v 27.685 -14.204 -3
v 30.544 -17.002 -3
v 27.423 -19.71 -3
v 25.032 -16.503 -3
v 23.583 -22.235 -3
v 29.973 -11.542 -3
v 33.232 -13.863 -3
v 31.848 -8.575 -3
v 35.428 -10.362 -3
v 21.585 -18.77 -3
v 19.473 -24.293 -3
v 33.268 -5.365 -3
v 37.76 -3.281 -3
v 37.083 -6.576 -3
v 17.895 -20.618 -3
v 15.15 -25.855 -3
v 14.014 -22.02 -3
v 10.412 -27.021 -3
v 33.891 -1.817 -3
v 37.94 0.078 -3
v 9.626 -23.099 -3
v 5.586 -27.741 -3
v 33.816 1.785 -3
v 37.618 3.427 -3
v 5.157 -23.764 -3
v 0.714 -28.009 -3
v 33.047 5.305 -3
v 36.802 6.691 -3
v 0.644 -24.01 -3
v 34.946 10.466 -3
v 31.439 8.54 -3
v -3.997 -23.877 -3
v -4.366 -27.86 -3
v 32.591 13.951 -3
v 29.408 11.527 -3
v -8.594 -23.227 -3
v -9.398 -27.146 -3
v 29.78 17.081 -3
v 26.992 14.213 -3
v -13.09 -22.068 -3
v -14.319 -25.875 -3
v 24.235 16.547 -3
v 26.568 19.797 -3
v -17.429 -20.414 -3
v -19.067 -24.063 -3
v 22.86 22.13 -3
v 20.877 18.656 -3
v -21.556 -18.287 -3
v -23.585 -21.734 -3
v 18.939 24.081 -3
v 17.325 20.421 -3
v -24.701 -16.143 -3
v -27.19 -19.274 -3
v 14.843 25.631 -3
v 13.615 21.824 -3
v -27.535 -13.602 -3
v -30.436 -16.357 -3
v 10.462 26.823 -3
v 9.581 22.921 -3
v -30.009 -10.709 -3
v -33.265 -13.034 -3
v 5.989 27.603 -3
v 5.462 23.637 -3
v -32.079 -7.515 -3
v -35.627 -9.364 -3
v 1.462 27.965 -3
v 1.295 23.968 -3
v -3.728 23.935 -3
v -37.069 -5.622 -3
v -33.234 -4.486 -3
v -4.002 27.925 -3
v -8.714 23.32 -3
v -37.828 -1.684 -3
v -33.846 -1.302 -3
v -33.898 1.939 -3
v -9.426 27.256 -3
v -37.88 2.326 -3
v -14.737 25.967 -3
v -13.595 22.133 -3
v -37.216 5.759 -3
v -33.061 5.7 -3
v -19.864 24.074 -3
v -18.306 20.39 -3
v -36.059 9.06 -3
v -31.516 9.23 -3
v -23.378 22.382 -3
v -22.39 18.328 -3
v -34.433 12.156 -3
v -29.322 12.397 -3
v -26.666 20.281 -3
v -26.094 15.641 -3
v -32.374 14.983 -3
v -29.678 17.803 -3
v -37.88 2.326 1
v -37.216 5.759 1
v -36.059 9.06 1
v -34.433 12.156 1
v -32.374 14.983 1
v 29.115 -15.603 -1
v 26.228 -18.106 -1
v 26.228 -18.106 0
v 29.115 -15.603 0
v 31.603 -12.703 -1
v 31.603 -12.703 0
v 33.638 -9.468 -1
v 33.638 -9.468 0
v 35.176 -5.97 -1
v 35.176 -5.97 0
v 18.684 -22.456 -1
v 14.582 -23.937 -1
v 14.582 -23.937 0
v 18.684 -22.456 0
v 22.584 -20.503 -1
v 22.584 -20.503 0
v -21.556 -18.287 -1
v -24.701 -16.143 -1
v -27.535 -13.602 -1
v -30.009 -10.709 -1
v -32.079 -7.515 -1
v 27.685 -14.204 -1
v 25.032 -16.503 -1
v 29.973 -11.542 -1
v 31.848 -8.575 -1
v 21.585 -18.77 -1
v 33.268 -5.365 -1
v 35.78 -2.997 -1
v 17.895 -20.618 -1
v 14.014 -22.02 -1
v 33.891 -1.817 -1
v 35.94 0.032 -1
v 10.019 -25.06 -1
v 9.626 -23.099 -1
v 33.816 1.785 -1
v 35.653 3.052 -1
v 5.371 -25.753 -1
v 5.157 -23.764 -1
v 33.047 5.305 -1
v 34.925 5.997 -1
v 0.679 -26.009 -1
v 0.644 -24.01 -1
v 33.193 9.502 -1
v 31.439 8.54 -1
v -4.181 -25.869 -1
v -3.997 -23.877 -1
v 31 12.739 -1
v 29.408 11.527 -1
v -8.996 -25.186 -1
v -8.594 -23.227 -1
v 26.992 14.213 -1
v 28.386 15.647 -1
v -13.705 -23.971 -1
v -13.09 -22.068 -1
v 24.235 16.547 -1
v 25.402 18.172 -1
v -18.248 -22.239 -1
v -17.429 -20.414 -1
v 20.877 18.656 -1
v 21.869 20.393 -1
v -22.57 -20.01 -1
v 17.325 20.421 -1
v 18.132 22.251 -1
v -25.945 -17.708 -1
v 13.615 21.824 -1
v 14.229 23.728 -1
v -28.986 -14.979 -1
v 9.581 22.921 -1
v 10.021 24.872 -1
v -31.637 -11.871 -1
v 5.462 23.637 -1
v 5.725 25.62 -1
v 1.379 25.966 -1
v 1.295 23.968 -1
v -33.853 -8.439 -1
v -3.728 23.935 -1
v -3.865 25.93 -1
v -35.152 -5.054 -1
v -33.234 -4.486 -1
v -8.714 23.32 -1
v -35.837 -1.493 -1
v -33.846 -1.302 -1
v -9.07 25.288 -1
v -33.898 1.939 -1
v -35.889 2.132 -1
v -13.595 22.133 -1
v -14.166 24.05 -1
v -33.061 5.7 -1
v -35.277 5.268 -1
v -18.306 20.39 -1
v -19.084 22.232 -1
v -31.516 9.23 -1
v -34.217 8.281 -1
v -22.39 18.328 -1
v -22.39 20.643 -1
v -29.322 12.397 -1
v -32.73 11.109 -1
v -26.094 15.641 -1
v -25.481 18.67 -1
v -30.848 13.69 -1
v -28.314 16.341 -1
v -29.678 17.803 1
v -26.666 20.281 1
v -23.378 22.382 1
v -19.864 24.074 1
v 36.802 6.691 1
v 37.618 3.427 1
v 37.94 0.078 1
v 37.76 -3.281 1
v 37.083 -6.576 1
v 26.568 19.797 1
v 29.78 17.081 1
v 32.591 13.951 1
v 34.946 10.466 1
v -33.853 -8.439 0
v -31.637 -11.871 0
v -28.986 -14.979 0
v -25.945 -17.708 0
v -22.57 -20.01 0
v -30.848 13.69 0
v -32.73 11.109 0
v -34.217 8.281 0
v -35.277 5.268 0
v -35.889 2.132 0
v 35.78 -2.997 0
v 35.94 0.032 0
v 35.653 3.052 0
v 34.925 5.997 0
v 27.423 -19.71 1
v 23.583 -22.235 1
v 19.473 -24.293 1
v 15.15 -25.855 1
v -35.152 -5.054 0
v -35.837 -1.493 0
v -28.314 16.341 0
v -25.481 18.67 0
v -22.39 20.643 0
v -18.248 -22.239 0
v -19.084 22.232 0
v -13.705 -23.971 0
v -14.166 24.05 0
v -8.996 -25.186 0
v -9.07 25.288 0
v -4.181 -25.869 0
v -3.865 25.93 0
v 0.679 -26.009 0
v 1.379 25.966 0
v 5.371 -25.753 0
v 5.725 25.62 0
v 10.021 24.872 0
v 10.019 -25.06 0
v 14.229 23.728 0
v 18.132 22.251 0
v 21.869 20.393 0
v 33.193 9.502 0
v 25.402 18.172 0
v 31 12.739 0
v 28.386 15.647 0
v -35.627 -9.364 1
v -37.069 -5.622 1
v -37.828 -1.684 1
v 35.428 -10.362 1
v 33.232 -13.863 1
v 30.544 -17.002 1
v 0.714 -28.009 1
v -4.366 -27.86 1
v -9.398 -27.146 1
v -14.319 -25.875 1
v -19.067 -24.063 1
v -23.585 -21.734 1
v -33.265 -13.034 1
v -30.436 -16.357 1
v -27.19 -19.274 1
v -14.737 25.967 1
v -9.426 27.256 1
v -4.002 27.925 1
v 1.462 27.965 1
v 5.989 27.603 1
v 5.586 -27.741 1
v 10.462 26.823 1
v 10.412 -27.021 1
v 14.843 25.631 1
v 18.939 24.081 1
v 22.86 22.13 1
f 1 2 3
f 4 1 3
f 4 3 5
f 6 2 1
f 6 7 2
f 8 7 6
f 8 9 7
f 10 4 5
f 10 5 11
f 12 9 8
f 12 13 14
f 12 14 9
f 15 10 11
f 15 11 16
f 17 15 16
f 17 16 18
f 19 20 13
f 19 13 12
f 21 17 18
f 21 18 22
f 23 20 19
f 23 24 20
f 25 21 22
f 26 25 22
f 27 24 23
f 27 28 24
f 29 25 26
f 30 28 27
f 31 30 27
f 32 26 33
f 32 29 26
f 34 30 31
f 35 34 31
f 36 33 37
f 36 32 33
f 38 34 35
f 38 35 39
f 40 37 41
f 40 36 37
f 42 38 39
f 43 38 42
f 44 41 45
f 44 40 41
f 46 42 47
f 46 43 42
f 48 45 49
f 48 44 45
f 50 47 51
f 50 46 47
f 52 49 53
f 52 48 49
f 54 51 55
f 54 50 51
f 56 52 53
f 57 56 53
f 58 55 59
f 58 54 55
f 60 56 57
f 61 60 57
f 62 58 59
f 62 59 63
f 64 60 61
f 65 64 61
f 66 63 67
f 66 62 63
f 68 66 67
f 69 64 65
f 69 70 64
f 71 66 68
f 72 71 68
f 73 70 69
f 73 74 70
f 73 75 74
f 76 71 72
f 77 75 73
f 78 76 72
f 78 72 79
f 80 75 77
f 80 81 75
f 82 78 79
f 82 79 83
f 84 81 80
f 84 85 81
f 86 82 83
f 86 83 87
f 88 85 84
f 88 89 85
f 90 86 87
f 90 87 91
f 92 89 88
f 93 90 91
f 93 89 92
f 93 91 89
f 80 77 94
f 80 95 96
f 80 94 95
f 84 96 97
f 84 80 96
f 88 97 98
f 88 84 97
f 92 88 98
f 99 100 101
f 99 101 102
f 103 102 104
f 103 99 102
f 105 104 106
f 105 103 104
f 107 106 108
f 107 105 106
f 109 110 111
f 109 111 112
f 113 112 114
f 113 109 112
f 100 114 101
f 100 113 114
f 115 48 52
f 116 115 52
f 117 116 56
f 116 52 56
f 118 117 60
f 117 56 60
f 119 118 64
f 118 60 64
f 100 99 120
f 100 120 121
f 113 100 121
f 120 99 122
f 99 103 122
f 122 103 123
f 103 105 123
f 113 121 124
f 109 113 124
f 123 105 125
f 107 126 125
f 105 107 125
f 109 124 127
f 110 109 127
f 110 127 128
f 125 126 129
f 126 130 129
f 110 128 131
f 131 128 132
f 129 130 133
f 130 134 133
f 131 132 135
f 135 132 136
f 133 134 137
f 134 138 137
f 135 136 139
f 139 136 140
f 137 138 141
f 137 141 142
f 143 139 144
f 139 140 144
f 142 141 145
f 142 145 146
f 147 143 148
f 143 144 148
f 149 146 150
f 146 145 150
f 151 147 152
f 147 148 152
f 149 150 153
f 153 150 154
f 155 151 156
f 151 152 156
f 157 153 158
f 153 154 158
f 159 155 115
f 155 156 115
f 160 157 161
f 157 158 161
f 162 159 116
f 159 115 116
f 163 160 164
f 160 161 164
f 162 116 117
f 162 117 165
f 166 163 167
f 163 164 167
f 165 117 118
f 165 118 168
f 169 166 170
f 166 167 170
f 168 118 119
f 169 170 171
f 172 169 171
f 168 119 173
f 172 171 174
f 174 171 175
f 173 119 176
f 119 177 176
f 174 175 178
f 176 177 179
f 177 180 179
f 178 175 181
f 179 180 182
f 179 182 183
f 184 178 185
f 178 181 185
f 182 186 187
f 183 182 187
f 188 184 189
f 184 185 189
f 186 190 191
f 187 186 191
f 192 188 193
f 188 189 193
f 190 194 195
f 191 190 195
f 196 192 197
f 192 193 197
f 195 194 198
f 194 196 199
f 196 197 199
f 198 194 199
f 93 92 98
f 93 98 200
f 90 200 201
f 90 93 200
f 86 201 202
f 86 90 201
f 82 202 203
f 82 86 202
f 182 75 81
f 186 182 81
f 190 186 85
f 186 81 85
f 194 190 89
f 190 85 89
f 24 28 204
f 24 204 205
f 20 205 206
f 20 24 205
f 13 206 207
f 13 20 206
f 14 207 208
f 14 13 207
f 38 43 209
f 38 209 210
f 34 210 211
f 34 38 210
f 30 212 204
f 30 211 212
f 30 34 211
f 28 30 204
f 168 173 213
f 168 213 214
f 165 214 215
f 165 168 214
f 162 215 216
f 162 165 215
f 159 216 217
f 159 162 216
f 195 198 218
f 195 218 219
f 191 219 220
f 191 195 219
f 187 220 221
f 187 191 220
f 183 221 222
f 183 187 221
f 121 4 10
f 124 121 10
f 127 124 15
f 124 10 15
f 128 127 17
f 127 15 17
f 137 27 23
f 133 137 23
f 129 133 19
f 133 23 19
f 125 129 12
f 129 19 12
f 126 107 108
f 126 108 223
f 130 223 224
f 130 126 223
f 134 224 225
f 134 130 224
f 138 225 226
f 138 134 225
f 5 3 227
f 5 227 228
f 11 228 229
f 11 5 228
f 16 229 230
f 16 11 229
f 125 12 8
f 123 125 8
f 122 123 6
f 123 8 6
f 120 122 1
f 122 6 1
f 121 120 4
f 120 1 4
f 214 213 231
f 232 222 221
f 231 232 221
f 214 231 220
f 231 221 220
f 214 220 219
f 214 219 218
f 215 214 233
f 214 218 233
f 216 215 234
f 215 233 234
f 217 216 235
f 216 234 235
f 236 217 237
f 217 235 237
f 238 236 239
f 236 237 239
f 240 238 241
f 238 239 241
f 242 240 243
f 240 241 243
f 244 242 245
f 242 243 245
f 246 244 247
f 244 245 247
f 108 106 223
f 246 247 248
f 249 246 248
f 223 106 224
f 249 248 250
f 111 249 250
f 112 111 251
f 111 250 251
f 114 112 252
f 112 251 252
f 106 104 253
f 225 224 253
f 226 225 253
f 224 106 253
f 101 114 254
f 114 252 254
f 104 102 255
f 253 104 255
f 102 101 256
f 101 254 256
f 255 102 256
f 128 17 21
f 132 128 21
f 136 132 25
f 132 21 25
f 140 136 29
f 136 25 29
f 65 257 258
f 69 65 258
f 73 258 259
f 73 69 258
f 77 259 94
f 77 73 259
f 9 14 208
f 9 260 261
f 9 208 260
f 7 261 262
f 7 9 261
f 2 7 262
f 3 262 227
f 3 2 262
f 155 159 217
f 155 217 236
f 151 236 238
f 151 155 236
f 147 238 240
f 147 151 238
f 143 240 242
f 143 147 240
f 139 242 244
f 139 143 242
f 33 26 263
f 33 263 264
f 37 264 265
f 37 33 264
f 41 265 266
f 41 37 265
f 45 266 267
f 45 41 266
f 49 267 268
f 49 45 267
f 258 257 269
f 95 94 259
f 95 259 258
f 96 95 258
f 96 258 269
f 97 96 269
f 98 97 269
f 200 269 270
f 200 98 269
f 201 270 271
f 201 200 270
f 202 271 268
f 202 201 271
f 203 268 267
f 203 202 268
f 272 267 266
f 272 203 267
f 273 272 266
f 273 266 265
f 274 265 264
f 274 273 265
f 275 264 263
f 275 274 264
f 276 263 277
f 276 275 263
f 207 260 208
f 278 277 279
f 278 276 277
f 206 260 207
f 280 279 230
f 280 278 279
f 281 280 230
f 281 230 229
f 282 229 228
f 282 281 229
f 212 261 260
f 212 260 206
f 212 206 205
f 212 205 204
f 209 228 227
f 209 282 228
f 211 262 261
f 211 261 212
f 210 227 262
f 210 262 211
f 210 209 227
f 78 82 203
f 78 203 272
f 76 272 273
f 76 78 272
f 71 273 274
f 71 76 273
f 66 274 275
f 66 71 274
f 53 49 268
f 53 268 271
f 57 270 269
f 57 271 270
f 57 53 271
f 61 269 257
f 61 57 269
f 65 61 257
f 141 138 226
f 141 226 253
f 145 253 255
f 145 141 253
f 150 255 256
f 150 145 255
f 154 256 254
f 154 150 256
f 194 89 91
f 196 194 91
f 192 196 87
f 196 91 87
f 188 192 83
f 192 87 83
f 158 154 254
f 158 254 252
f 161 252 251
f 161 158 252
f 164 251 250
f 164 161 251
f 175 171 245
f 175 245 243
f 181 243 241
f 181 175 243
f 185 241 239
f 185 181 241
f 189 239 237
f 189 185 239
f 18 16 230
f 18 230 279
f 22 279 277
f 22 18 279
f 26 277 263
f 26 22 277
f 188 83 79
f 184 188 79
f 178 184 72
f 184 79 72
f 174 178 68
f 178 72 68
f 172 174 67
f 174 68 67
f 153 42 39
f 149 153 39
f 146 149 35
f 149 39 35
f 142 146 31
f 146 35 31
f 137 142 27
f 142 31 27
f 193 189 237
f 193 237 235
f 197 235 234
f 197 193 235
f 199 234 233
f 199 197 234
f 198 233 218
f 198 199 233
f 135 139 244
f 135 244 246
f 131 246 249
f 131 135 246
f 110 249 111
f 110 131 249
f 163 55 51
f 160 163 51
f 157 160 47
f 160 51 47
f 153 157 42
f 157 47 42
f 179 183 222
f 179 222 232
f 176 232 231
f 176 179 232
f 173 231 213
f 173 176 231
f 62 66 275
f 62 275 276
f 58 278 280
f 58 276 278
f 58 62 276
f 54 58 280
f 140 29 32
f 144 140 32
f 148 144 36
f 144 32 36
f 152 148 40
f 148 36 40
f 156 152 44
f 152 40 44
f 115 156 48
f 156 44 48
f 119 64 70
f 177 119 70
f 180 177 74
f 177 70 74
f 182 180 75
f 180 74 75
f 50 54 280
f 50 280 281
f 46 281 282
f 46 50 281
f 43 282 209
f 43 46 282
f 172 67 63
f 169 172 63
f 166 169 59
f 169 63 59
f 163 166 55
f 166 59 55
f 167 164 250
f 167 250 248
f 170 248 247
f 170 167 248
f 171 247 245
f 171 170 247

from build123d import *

# Parameters (mm, degrees)
BOSS_EXTRUDE1_DEPTH = 1
BOSS_EXTRUDE2_START = -2
BOSS_EXTRUDE2_DEPTH = 2
BOSS_EXTRUDE3_START = 2
BOSS_EXTRUDE3_DEPTH = 2


with BuildPart() as part:
    # Sketch2 → Boss-Extrude1 (new body)
    with BuildSketch(Plane.XY):
        with BuildLine():
            ThreePointArc((14.582306461, -23.937478676), (20.662688223, -21.536481735), (26.227582561, -18.10606198))
            ThreePointArc((26.227582561, -18.10606198), (31.602803157, -12.702637223), (35.175830441, -5.970366314))
            ThreePointArc((35.175830441, -5.970366314), (35.940455788, 0.032211939), (34.924872534, 5.997460321))
            ThreePointArc((34.924872534, 5.997460321), (30.999615253, 12.739070672), (25.401678251, 18.172306925))
            ThreePointArc((25.401678251, 18.172306925), (20.023450582, 21.36826462), (14.22923276, 23.727611624))
            ThreePointArc((14.22923276, 23.727611624), (7.882073391, 25.295796991), (1.378547715, 25.966461733))
            ThreePointArc((1.378547715, 25.966461733), (-9.069964823, 25.28846457), (-19.084442092, 22.232104078))
            ThreePointArc((-19.084442092, 22.232104078), (-25.480773521, 18.669901445), (-30.847619904, 13.690011561))
            ThreePointArc((-30.847619904, 13.690011561), (-34.216625408, 8.281245191), (-35.888880176, 2.132382229))
            ThreePointArc((-35.888880176, 2.132382229), (-35.572811659, -3.288450427), (-33.85309471, -8.438974634))
            ThreePointArc((-33.85309471, -8.438974634), (-28.98576201, -14.979441817), (-22.570123581, -20.01016961))
            ThreePointArc((-22.570123581, -20.01016961), (-11.367274893, -24.644691823), (0.679303276, -26.009451613))
            ThreePointArc((0.679303276, -26.009451613), (7.703427235, -25.460763497), (14.582306461, -23.937478676))
        make_face()
    extrude(amount=BOSS_EXTRUDE1_DEPTH)

    # Sketch3 → Boss-Extrude2 (add)
    with BuildSketch(Plane.XY.offset(1).offset(BOSS_EXTRUDE2_START)):
        with BuildLine():
            ThreePointArc((-23.584596954, -21.733783191), (-11.876170523, -26.578887071), (0.714158664, -28.009233893))
            ThreePointArc((0.714158664, -28.009233893), (8.007585987, -27.437521821), (15.150208477, -25.855156256))
            ThreePointArc((15.150208477, -25.855156256), (21.558193731, -23.324796552), (27.422917732, -19.709549999))
            ThreePointArc((27.422917732, -19.709549999), (33.232049111, -13.863052711), (37.082922231, -6.576193708))
            ThreePointArc((37.082922231, -6.576193708), (37.93992708, 0.078373421), (36.802232938, 6.690738583))
            ThreePointArc((36.802232938, 6.690738583), (32.590590722, 13.951259274), (26.567668782, 19.797412042))
            ThreePointArc((26.567668782, 19.797412042), (20.924163176, 23.153997512), (14.843057348, 25.631087228))
            ThreePointArc((14.843057348, 25.631087228), (8.234147075, 27.264583601), (1.462460857, 27.964777266))
            ThreePointArc((1.462460857, 27.964777266), (-9.426205562, 27.256483976), (-19.863550161, 24.074256219))
            ThreePointArc((-19.863550161, 24.074256219), (-26.665599434, 20.281211791), (-32.373640199, 14.982784573))
            ThreePointArc((-32.373640199, 14.982784573), (-36.059000484, 9.059793769), (-37.879998788, 2.325726228))
            ThreePointArc((-37.879998788, 2.325726228), (-37.536082018, -3.670000019), (-35.627002731, -9.364069587))
            ThreePointArc((-35.627002731, -9.364069587), (-30.435882217, -16.357044434), (-23.584596954, -21.733783191))
        make_face()
        with BuildLine():
            ThreePointArc((-22.570123581, -20.01016961), (-11.367274893, -24.644691823), (0.679303276, -26.009451613))
            ThreePointArc((0.679303276, -26.009451613), (7.703427235, -25.460763497), (14.582306461, -23.937478676))
            ThreePointArc((14.582306461, -23.937478676), (20.662688223, -21.536481735), (26.227582561, -18.10606198))
            ThreePointArc((26.227582561, -18.10606198), (31.602803157, -12.702637223), (35.175830441, -5.970366314))
            ThreePointArc((35.175830441, -5.970366314), (35.940455788, 0.032211939), (34.924872534, 5.997460321))
            ThreePointArc((34.924872534, 5.997460321), (30.999615253, 12.739070672), (25.401678251, 18.172306925))
            ThreePointArc((25.401678251, 18.172306925), (20.023450582, 21.36826462), (14.22923276, 23.727611624))
            ThreePointArc((14.22923276, 23.727611624), (7.882073391, 25.295796991), (1.378547715, 25.966461733))
            ThreePointArc((1.378547715, 25.966461733), (-9.069964823, 25.28846457), (-19.084442092, 22.232104078))
            ThreePointArc((-19.084442092, 22.232104078), (-25.480773521, 18.669901445), (-30.847619904, 13.690011561))
            ThreePointArc((-30.847619904, 13.690011561), (-34.216625408, 8.281245191), (-35.888880176, 2.132382229))
            ThreePointArc((-35.888880176, 2.132382229), (-35.572811659, -3.288450427), (-33.85309471, -8.438974634))
            ThreePointArc((-33.85309471, -8.438974634), (-28.98576201, -14.979441817), (-22.570123581, -20.01016961))
        make_face(mode=Mode.SUBTRACT)
    extrude(amount=BOSS_EXTRUDE2_DEPTH)

    # Sketch4 → Boss-Extrude3 (add)
    with BuildSketch(Plane(origin=(0, 0, -1), x_dir=(-1, 0, 0), z_dir=(0, 0, -1)).offset(BOSS_EXTRUDE3_START)):
        with BuildLine():
            ThreePointArc((23.584596954, -21.733783191), (30.435882217, -16.357044434), (35.627002731, -9.364069587))
            ThreePointArc((35.627002731, -9.364069587), (37.536082018, -3.670000019), (37.879998788, 2.325726228))
            ThreePointArc((37.879998788, 2.325726228), (36.059000484, 9.059793769), (32.373640199, 14.982784573))
            ThreePointArc((32.373640199, 14.982784573), (26.665599434, 20.281211791), (19.863550161, 24.074256219))
            ThreePointArc((19.863550161, 24.074256219), (9.426205562, 27.256483976), (-1.462460857, 27.964777266))
            ThreePointArc((-1.462460857, 27.964777266), (-8.234147075, 27.264583601), (-14.843057348, 25.631087228))
            ThreePointArc((-14.843057348, 25.631087228), (-20.924163176, 23.153997512), (-26.567668782, 19.797412042))
            ThreePointArc((-26.567668782, 19.797412042), (-32.590590722, 13.951259274), (-36.802232938, 6.690738583))
            ThreePointArc((-36.802232938, 6.690738583), (-37.93992708, 0.078373421), (-37.082922231, -6.576193708))
            ThreePointArc((-37.082922231, -6.576193708), (-33.232049111, -13.863052711), (-27.422917732, -19.709549999))
            ThreePointArc((-27.422917732, -19.709549999), (-21.558193731, -23.324796552), (-15.150208477, -25.855156256))
            ThreePointArc((-15.150208477, -25.855156256), (-8.007585987, -27.437521821), (-0.714158664, -28.009233893))
            ThreePointArc((-0.714158664, -28.009233893), (11.876170523, -26.578887071), (23.584596954, -21.733783191))
        make_face()
        with BuildLine():
            ThreePointArc((21.555650209, -18.286556029), (27.535330411, -13.602126211), (32.078697256, -7.514575328))
            ThreePointArc((32.078697256, -7.514575328), (33.609473864, -2.907248333), (33.897648559, 1.939162133))
            ThreePointArc((33.897648559, 1.939162133), (32.374200723, 7.502749449), (29.321599609, 12.39723855))
            ThreePointArc((29.321599609, 12.39723855), (24.296047221, 17.05851306), (18.305561132, 20.389839116))
            ThreePointArc((18.305561132, 20.389839116), (8.713855119, 23.320421058), (-1.294621046, 23.968139818))
            ThreePointArc((-1.294621046, 23.968139818), (-7.529992858, 23.327009842), (-13.615408172, 21.82413602))
            ThreePointArc((-13.615408172, 21.82413602), (-19.122622483, 19.582585616), (-24.235471698, 16.547337587))
            ThreePointArc((-24.235471698, 16.547337587), (-29.408223084, 11.527376998), (-33.046936389, 5.305068206))
            ThreePointArc((-33.046936389, 5.305068206), (-33.940979932, -0.013771926), (-33.268351754, -5.365121806))
            ThreePointArc((-33.268351754, -5.365121806), (-29.973321616, -11.542469618), (-25.032247389, -16.502573961))
            ThreePointArc((-25.032247389, -16.502573961), (-19.767182716, -19.748166918), (-14.014404446, -22.019801096))
            ThreePointArc((-14.014404446, -22.019801096), (-7.399238865, -23.484007784), (-0.644388471, -24.00966267))
            ThreePointArc((-0.644388471, -24.00966267), (10.858407416, -22.710487179), (21.555650209, -18.286556029))
        make_face(mode=Mode.SUBTRACT)
    extrude(amount=-BOSS_EXTRUDE3_DEPTH)


solid = part.part
